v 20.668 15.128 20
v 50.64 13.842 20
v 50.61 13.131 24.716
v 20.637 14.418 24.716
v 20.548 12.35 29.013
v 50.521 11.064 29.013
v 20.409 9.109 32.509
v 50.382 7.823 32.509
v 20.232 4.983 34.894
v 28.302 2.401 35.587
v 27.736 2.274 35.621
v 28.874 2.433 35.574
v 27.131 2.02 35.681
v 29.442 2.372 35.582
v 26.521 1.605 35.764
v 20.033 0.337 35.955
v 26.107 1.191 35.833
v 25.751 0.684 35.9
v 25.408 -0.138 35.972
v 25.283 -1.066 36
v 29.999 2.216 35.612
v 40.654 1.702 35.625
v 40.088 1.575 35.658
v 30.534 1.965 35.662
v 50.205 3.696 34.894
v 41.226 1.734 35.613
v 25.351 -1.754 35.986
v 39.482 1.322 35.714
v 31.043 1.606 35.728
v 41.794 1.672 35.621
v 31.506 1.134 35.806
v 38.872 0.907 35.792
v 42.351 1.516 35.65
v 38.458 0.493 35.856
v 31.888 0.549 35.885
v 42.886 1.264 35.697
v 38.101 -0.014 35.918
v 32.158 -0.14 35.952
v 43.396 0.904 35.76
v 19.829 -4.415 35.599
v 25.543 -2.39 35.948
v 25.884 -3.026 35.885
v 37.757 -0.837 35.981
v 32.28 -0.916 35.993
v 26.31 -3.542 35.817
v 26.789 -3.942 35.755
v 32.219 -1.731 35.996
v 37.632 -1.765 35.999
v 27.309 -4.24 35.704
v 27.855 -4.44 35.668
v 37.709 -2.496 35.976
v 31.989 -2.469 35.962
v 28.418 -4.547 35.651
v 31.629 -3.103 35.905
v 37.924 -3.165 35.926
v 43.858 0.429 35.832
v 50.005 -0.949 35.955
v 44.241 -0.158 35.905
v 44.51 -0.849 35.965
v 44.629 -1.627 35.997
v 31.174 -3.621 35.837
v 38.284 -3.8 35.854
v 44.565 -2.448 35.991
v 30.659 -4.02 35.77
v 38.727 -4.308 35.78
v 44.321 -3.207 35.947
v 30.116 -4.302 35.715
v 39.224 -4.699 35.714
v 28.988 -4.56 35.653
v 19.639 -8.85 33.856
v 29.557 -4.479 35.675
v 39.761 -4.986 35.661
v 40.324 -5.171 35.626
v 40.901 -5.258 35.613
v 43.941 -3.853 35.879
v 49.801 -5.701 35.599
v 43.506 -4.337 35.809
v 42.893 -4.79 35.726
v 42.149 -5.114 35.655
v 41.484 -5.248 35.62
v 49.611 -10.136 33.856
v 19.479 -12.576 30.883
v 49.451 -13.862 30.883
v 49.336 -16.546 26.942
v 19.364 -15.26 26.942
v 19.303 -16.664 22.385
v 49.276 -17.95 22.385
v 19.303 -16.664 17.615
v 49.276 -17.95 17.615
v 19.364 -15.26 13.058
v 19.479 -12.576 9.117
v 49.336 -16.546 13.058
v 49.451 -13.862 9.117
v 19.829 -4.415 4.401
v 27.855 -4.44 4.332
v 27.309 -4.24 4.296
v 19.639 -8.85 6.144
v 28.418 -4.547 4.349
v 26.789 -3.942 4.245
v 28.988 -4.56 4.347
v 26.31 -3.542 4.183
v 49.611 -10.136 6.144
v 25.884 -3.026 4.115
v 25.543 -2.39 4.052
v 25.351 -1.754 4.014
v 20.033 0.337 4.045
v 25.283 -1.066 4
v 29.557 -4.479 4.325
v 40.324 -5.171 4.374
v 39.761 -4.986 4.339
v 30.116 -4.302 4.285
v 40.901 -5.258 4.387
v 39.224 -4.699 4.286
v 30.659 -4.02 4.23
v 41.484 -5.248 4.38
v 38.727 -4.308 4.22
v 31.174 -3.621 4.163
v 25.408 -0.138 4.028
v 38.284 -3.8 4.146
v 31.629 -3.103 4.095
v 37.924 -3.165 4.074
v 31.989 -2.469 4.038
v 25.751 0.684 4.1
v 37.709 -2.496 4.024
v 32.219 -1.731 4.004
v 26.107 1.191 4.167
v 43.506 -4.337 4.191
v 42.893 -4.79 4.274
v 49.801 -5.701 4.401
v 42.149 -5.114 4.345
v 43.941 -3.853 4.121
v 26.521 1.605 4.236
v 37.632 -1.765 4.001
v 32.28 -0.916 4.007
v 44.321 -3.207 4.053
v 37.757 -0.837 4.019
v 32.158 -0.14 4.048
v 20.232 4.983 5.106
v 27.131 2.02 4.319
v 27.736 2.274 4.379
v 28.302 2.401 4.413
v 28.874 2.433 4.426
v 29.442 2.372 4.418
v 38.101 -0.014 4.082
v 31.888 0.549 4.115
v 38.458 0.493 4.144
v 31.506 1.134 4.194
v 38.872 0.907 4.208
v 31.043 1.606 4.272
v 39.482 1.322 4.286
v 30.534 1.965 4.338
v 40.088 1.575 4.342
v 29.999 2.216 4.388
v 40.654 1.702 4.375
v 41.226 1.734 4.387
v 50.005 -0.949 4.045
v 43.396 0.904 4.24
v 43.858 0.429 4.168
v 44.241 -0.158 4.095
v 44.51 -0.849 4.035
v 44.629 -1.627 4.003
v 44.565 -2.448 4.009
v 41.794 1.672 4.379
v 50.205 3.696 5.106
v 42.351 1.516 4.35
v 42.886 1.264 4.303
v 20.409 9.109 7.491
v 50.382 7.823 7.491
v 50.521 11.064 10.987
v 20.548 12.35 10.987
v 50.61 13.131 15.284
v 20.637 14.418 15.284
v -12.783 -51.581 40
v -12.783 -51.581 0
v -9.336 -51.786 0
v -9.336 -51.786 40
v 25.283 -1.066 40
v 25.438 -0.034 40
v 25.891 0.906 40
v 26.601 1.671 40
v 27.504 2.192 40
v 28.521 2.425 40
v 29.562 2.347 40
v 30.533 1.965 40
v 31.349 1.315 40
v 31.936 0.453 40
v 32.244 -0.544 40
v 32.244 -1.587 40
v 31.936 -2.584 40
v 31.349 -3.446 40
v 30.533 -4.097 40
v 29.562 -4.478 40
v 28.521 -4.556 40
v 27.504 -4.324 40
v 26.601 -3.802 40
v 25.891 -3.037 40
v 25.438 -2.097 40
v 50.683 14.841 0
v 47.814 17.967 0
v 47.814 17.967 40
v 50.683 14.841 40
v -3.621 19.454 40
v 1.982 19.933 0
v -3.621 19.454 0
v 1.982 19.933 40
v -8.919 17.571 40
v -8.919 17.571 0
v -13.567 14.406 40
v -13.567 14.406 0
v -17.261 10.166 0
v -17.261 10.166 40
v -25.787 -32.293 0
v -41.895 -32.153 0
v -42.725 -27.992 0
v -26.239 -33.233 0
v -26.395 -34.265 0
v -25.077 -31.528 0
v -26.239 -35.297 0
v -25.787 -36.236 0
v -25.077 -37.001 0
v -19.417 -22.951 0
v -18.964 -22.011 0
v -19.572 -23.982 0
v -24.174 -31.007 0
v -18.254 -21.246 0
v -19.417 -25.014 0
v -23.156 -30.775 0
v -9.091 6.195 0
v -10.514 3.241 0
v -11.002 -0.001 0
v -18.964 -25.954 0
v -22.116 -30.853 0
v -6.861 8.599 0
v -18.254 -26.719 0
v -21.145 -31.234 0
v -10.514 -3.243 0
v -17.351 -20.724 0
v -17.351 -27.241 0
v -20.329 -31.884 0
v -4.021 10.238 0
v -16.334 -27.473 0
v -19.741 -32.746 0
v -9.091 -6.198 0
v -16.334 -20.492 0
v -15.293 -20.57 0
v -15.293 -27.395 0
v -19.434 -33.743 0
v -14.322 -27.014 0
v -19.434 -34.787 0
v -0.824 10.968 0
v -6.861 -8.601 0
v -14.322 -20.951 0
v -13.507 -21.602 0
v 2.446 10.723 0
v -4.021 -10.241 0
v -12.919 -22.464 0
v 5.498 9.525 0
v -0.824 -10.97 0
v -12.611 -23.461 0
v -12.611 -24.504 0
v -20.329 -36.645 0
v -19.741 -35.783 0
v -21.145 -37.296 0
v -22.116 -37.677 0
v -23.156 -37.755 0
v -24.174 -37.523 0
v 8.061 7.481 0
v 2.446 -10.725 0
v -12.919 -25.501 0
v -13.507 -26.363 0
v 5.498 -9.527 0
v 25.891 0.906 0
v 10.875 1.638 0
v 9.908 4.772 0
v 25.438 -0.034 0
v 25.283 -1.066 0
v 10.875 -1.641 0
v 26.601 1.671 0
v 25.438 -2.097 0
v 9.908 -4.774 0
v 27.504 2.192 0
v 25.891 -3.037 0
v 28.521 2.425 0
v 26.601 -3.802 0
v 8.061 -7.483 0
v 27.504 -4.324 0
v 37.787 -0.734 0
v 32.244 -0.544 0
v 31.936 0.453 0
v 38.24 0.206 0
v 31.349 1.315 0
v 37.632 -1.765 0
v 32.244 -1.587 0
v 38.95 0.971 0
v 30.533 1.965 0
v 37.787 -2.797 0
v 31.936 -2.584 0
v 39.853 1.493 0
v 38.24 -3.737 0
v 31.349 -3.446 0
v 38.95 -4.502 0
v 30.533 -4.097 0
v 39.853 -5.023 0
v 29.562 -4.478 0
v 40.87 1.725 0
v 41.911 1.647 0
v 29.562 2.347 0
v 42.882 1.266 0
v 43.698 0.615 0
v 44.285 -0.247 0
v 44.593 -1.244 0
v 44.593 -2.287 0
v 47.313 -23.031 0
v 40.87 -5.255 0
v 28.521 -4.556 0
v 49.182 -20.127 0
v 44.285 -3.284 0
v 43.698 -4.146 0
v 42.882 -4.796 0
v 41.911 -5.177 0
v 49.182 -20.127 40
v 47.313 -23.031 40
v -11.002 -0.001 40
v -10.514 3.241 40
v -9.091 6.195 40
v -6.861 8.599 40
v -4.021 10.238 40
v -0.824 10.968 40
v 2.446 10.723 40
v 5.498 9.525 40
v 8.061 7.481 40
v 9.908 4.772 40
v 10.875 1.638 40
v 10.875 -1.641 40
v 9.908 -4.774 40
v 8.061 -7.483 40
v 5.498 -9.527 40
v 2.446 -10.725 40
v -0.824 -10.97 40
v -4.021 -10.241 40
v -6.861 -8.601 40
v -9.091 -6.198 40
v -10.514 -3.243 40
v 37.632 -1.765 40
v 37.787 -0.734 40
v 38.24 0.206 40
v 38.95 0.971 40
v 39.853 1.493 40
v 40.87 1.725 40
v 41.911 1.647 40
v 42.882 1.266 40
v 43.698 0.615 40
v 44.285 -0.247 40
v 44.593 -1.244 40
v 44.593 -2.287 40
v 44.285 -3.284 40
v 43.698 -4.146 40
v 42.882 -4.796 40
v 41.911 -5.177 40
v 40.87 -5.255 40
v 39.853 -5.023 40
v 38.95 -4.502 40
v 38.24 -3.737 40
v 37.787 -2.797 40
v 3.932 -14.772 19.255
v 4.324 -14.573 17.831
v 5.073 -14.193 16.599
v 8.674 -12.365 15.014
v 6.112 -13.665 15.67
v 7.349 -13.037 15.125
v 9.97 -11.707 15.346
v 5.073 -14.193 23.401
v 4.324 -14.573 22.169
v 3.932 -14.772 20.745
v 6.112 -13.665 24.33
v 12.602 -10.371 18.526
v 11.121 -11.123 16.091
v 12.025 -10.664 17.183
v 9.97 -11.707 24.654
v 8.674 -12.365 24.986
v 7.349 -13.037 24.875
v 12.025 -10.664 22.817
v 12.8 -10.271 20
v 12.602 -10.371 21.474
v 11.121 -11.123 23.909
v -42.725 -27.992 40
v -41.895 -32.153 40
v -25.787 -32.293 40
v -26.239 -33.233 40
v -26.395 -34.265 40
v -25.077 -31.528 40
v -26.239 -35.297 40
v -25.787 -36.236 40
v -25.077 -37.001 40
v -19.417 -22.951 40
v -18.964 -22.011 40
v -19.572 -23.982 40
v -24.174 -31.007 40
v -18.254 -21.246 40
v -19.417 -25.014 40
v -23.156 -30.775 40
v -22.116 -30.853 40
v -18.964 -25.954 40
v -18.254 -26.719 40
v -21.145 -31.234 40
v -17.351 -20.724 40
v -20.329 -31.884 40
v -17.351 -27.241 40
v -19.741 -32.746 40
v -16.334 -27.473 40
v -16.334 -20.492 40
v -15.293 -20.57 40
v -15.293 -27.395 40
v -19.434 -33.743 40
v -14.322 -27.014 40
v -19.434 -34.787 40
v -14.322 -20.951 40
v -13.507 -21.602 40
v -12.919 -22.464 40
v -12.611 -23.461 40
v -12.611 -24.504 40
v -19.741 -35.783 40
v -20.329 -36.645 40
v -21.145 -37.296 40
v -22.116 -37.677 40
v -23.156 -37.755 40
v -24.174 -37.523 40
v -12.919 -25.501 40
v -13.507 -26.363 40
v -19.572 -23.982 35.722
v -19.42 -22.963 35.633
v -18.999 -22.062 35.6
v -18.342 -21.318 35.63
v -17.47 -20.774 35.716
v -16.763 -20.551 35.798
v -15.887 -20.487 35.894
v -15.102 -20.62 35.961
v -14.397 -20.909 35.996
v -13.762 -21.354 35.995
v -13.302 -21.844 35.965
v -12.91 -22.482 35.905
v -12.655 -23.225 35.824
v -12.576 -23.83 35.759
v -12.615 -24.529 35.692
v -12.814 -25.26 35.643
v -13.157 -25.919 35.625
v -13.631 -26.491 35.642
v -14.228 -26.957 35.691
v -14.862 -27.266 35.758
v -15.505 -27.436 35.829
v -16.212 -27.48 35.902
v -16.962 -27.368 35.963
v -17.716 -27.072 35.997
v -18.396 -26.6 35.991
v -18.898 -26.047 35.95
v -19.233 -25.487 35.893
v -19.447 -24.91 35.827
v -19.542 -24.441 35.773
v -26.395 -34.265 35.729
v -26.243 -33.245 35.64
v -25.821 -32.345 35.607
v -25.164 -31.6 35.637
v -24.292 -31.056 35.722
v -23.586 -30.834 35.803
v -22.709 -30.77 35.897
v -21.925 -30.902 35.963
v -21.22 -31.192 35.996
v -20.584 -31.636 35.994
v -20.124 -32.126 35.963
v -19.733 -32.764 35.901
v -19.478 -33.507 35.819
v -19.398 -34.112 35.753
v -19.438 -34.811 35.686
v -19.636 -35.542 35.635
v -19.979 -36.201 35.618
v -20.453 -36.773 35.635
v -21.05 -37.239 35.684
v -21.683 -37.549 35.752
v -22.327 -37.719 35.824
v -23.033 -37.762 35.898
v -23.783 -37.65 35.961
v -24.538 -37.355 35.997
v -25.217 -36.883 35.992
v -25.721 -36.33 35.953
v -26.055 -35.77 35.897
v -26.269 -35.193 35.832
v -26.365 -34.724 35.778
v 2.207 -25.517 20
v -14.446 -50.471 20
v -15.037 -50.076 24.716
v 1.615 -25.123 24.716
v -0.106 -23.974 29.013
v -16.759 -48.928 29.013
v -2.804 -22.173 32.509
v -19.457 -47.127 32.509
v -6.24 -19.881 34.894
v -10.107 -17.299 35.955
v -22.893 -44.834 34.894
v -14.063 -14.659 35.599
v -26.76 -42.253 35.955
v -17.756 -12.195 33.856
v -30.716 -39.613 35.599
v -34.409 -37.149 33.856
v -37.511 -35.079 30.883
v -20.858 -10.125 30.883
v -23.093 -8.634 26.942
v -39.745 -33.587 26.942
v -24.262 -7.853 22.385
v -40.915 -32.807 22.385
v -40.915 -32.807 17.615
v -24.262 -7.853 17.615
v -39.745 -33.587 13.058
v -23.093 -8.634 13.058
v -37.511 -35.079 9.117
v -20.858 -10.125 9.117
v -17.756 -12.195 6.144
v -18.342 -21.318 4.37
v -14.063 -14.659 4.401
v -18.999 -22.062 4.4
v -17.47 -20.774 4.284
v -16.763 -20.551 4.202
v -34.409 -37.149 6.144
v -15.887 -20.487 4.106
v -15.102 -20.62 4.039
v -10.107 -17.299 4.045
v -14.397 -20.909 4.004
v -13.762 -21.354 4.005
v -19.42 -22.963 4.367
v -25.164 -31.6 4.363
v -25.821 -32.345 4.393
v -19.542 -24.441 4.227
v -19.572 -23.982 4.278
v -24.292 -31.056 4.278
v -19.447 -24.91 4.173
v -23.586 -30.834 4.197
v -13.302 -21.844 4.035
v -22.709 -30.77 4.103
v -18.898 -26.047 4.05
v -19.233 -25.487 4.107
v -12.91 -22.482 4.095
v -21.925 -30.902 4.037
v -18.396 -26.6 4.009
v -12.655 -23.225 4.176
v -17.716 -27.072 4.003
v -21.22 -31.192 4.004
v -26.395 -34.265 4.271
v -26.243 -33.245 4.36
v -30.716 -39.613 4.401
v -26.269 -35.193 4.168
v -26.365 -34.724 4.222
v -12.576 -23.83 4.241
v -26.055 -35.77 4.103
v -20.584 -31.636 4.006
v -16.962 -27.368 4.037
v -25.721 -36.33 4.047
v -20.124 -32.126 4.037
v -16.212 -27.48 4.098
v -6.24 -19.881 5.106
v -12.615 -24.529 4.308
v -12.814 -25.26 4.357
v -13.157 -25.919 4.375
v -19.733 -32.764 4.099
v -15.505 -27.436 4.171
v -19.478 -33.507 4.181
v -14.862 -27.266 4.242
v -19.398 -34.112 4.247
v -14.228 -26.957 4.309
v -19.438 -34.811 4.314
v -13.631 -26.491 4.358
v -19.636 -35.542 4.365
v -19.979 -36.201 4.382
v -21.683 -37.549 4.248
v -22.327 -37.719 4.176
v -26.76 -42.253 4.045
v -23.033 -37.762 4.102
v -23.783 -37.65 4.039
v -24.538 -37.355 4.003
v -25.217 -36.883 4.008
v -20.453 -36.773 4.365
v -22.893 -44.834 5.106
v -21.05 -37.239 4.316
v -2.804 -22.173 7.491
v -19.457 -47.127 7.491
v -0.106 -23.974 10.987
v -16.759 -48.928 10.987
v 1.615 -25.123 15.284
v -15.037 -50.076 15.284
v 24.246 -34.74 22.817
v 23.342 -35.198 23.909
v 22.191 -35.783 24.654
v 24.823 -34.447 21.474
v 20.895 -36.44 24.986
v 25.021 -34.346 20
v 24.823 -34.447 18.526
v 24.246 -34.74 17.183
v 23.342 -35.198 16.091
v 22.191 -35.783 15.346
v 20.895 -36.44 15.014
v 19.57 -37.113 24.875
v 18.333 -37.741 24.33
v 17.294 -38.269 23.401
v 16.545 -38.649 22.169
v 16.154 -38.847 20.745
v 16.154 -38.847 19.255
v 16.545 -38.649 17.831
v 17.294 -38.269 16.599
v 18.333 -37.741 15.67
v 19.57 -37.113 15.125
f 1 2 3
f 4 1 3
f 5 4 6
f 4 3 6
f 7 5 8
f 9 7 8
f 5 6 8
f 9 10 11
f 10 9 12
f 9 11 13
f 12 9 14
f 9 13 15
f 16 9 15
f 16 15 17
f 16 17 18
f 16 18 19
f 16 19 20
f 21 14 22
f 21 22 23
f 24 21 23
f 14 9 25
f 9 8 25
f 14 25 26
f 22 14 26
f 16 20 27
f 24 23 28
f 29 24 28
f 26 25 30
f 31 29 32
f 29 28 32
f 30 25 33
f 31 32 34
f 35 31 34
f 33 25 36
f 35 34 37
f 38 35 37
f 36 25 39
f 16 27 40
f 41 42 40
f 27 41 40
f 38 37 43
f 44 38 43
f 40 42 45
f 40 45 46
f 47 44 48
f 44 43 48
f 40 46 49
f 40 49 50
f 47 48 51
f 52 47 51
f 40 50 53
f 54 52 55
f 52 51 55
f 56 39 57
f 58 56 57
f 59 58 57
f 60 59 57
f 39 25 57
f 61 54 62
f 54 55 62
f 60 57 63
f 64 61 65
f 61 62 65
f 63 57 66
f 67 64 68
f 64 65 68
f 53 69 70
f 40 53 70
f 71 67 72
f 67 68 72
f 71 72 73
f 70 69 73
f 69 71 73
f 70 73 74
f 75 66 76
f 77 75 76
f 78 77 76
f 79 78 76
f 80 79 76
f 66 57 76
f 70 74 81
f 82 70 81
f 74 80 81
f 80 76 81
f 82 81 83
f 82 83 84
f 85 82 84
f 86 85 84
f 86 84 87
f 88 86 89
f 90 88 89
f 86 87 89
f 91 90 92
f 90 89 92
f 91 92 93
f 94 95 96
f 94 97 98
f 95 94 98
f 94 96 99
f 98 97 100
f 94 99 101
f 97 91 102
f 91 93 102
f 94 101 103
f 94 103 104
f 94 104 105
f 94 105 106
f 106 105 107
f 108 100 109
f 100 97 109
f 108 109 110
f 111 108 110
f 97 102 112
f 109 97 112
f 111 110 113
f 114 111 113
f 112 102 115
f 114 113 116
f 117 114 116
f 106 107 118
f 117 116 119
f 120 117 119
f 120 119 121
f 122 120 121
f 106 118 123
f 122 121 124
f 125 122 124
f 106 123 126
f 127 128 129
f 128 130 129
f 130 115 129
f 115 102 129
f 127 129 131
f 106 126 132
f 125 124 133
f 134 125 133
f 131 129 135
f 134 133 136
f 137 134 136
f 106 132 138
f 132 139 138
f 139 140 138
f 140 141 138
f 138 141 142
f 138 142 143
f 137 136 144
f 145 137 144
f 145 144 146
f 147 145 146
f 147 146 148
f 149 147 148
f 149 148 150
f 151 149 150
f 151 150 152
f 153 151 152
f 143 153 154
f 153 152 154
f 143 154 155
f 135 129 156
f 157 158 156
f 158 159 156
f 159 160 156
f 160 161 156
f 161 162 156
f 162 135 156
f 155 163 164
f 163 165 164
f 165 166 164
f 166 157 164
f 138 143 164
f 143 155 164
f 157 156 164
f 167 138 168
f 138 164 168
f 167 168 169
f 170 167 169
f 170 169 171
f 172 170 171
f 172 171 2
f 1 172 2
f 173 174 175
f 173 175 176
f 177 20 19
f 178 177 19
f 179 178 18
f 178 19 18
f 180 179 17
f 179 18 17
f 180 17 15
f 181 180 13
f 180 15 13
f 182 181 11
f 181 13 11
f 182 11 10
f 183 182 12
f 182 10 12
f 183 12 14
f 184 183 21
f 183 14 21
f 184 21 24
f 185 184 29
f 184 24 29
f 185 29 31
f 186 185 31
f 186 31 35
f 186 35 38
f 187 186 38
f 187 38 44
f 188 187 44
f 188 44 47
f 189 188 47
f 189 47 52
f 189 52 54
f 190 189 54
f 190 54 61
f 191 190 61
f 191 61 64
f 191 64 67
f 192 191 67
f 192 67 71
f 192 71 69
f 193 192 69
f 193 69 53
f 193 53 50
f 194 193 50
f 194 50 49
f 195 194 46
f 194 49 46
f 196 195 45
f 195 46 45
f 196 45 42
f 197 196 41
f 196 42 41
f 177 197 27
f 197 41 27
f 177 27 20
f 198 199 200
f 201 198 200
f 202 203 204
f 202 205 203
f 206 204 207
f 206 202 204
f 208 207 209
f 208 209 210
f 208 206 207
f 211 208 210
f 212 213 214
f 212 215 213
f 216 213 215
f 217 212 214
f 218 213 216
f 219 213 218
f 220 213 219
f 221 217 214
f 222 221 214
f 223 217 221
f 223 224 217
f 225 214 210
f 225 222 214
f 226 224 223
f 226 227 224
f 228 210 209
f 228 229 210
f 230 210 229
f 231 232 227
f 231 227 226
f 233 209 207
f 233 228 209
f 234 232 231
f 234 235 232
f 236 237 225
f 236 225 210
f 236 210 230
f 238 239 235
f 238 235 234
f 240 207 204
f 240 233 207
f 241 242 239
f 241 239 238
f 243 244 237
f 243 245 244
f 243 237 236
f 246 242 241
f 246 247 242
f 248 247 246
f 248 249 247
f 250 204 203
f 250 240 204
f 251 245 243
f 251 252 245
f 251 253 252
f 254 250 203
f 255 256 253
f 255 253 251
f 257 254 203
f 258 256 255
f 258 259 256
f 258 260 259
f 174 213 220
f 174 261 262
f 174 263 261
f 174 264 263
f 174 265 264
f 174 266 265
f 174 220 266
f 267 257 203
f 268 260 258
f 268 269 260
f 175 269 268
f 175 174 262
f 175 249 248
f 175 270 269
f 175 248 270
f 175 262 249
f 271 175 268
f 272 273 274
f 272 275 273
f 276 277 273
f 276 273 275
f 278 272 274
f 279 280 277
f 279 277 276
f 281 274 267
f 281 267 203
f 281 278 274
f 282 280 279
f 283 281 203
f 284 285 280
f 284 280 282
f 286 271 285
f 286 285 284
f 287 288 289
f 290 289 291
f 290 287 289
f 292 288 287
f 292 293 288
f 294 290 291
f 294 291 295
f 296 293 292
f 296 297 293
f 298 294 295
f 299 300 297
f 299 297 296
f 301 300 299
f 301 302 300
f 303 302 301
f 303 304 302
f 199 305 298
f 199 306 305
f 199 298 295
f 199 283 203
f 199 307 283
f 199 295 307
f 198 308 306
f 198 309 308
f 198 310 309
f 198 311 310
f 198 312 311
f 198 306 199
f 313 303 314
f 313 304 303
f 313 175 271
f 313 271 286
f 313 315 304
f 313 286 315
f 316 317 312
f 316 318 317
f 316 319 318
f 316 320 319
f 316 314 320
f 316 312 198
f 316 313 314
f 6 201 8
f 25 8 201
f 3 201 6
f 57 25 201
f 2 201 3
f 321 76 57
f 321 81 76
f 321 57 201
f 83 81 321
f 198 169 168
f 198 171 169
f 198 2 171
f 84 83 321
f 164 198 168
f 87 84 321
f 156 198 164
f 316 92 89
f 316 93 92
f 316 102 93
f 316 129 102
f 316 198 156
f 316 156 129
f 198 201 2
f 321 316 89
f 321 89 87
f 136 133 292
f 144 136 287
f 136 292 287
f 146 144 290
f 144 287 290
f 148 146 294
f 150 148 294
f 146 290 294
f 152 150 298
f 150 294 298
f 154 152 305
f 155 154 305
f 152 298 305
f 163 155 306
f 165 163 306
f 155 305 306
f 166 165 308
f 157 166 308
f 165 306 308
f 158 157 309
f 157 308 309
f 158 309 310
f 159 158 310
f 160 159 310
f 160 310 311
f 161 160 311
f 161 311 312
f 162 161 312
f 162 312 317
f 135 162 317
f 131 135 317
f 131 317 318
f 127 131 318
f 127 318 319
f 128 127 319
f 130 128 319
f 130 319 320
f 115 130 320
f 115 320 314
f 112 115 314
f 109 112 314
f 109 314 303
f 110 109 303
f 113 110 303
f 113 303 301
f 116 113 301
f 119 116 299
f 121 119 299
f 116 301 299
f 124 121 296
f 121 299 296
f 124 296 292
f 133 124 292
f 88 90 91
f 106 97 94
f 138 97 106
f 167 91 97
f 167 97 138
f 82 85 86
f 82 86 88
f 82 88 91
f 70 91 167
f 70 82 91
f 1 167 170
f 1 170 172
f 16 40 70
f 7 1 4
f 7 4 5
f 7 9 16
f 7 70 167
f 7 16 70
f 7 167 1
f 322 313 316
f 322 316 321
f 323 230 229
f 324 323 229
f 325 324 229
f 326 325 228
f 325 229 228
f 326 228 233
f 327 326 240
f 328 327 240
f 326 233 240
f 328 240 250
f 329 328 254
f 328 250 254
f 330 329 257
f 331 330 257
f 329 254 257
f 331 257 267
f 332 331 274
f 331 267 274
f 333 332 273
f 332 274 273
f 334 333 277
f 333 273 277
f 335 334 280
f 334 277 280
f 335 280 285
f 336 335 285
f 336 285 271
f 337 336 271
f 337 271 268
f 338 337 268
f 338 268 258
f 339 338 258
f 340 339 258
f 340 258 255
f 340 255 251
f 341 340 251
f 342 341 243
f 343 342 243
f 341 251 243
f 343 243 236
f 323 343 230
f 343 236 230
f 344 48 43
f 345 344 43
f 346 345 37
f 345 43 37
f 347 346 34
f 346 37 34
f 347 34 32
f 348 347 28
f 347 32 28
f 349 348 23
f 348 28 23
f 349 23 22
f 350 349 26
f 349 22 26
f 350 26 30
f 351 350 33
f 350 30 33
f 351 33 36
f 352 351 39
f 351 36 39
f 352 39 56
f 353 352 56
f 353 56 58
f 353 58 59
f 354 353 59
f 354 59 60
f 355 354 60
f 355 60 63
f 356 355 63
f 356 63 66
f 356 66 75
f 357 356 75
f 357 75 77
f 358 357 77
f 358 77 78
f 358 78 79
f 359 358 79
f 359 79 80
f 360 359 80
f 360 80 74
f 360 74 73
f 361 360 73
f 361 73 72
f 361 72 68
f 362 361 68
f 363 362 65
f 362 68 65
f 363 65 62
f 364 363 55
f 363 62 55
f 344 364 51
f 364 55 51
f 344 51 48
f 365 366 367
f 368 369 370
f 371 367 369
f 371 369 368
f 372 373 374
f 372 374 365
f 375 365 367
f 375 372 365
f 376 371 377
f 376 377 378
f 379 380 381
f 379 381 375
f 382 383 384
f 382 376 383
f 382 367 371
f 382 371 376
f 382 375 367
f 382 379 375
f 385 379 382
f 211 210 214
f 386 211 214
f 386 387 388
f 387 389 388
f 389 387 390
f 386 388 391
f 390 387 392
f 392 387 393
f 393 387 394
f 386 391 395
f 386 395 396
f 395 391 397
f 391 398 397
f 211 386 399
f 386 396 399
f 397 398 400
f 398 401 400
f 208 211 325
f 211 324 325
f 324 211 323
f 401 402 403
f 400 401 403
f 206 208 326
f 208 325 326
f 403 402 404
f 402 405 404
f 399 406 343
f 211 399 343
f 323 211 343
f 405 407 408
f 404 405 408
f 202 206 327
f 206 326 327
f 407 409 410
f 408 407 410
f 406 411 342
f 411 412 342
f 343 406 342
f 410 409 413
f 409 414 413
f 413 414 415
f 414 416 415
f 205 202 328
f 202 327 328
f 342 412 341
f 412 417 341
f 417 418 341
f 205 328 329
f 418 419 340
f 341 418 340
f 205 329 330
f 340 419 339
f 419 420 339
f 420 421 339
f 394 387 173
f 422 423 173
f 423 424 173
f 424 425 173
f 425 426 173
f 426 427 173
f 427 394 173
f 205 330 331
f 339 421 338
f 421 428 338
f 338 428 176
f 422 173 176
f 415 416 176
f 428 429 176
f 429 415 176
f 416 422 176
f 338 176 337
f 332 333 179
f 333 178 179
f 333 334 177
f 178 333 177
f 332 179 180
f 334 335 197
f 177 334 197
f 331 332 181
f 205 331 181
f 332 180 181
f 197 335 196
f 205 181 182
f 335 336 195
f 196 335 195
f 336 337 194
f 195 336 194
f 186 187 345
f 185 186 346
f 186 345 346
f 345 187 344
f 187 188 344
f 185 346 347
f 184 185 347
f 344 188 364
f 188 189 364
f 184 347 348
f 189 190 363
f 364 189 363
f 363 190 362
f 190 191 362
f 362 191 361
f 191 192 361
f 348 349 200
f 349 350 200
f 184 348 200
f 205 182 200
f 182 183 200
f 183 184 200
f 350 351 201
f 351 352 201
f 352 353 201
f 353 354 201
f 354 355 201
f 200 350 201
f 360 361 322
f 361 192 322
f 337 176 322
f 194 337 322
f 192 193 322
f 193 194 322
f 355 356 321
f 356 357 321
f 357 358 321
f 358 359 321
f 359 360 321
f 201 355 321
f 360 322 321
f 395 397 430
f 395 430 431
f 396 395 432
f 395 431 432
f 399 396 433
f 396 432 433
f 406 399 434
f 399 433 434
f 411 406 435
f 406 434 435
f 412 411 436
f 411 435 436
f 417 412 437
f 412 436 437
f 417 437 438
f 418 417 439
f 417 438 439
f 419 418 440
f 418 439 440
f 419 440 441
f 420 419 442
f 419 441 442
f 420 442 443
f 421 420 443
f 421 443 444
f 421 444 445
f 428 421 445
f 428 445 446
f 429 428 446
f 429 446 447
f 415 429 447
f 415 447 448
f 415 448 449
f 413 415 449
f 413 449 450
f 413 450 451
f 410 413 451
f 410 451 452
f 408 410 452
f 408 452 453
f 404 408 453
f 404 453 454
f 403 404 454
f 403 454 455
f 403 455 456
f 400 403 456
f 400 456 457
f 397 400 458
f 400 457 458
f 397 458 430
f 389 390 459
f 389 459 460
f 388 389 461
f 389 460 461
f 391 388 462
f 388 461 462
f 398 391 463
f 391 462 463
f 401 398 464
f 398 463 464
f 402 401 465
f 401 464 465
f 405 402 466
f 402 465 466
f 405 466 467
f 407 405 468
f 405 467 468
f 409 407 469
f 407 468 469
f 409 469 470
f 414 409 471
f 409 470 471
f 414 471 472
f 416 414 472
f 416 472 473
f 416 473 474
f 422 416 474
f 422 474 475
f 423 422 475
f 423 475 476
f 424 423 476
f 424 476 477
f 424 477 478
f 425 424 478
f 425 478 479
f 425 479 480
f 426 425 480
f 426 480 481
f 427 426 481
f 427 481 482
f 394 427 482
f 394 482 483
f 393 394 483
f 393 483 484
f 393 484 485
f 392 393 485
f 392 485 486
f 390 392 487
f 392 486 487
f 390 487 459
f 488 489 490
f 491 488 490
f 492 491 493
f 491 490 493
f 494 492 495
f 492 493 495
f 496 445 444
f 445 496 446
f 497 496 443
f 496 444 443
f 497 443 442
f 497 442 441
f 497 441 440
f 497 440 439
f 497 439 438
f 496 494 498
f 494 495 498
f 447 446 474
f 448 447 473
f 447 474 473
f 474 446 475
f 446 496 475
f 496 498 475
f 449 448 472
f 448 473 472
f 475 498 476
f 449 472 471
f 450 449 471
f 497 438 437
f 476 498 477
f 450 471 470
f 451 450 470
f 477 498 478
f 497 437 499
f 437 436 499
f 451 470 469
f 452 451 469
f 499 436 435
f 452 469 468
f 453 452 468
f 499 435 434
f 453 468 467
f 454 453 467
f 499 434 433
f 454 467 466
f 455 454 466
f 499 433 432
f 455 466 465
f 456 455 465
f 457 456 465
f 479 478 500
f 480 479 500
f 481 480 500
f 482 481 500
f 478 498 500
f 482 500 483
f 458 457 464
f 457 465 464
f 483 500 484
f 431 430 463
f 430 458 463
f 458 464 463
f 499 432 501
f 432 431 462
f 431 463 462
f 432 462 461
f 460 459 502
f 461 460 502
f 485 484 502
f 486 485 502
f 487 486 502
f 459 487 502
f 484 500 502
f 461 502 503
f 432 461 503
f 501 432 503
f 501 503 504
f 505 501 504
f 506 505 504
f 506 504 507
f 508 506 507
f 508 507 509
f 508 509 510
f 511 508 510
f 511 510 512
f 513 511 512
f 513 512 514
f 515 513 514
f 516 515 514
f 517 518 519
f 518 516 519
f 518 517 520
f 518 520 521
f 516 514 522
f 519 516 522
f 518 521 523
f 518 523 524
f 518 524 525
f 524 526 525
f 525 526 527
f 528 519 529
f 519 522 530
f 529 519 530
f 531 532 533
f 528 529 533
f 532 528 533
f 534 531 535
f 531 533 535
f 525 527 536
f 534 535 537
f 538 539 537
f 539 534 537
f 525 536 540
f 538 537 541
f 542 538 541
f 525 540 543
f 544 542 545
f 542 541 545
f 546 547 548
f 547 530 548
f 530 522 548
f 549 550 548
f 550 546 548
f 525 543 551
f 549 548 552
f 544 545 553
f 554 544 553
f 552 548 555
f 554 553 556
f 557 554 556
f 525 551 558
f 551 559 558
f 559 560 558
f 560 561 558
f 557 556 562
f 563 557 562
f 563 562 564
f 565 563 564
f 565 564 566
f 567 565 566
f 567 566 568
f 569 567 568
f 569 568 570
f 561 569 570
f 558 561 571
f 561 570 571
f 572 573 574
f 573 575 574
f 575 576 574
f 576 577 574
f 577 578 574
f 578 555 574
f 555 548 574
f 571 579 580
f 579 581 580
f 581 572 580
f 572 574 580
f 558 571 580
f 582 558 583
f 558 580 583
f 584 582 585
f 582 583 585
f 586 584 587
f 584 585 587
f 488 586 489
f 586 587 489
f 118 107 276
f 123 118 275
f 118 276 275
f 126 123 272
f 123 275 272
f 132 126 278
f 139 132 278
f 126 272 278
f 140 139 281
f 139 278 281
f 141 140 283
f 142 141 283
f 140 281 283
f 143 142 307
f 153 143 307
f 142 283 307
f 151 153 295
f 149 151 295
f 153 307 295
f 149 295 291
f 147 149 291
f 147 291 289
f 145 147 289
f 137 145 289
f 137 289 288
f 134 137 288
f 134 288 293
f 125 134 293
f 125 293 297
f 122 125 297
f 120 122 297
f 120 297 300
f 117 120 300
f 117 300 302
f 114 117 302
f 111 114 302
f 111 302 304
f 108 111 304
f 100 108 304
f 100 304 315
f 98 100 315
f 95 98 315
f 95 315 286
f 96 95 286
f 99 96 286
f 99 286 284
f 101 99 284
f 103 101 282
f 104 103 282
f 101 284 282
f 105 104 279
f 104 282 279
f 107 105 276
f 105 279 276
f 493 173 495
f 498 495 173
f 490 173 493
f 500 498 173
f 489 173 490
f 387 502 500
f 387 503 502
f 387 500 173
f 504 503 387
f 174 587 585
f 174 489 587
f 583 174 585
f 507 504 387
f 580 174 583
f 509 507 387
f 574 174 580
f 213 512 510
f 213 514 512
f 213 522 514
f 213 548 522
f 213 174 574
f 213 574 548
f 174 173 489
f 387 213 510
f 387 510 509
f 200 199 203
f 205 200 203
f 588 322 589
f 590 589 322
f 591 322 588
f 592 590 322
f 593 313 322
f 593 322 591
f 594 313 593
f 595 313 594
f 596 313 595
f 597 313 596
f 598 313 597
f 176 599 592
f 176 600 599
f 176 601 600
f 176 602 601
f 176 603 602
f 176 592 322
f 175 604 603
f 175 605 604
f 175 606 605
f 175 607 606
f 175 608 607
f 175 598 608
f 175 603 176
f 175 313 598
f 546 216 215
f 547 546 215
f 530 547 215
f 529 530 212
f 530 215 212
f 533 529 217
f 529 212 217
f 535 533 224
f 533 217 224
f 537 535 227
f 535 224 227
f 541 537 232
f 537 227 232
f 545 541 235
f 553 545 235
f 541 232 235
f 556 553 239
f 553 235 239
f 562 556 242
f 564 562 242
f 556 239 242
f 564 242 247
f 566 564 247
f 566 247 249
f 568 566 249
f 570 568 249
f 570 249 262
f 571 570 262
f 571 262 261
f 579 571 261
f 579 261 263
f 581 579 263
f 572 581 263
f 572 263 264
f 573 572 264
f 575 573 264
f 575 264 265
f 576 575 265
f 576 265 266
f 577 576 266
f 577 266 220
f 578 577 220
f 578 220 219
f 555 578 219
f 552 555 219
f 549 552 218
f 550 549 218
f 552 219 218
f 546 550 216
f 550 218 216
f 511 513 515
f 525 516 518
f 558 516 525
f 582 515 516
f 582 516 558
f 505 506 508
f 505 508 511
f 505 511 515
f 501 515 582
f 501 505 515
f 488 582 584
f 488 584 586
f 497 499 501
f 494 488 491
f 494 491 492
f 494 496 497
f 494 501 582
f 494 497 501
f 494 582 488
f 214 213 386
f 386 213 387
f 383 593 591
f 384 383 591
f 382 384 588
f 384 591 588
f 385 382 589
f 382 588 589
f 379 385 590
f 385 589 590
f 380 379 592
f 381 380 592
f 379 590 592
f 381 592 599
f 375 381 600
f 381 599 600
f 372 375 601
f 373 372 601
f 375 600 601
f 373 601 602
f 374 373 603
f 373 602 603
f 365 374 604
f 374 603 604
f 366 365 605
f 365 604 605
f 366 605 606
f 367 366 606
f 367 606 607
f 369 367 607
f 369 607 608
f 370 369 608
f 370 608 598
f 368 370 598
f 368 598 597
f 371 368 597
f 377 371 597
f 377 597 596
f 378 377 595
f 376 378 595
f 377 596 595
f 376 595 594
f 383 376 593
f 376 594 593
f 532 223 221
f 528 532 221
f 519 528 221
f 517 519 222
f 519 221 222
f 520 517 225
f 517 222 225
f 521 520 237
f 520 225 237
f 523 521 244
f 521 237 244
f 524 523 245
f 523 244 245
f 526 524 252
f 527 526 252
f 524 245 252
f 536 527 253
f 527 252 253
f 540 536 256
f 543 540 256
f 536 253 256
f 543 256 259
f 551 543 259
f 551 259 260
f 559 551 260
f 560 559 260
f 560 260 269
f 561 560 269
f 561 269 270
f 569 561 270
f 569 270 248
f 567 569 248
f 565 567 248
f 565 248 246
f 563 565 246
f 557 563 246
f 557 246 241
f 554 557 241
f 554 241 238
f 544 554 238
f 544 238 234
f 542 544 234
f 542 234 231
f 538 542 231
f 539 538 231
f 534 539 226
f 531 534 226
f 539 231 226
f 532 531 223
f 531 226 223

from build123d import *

# Parameters (mm, degrees)
BOSS_EXTRUDE6_DEPTH = 40
SKETCH9_R           = 16
CUT_EXTRUDE3_DEPTH  = 30
SKETCH10_R          = 16
CUT_EXTRUDE4_DEPTH  = 30
CUT_EXTRUDE5_REACH  = 89.959
SKETCH11_R          = 3.5
SKETCH12_R          = 11
CUT_EXTRUDE6_DEPTH  = 40
SKETCH14_W          = 106.764973624
SKETCH14_H          = 40
BOSS_EXTRUDE7_DEPTH = 5
CUT_EXTRUDE8_DEPTH  = 40
FILLET1_R           = 22
CHAMFER5_SIZE       = 2
CHAMFER6_SIZE       = 3
SKETCH16_R          = 5
CUT_EXTRUDE9_DEPTH  = 27


with BuildPart() as part:
    # Sketch8 → Boss-Extrude6 (new body)
    with BuildSketch(Plane.XY):
        Polygon((-57.969476198, -3.736595203), (37.23247397, 44.588846099), (50.811489539, 17.83795198), (-44.390460629, -30.487489322), align=None)
        Polygon((50.811489539, 17.83795198), (49.096562756, -22.125268937), (-11.118961612, -52.691258219), (-44.390460629, -30.487489322), align=None)
    extrude(amount=BOSS_EXTRUDE6_DEPTH)

    # Sketch9 → Cut-Extrude3 (cut)
    with BuildSketch(Plane(origin=(-27.75471112, -41.58937377, 0), x_dir=(-0.8317874754097543, 0.5550942224086534, 0), z_dir=(-0.5550942224086534, -0.8317874754097543, 0))):
        with Locations(Location((0, -20, 0), (0, 0, 180))):
            Circle(SKETCH9_R)
    extrude(amount=-CUT_EXTRUDE3_DEPTH, mode=Mode.SUBTRACT)

    # Sketch10 → Cut-Extrude4 (cut)
    with BuildSketch(Plane(origin=(49.954026147, -2.143658479, 0), x_dir=(0, 0, -1), z_dir=(0.9990805229464255, -0.04287316957138965, 0))):
        with Locations(Location((-20, 0, 0), (0, 0, 90))):
            Circle(SKETCH10_R)
    extrude(amount=-CUT_EXTRUDE4_DEPTH, mode=Mode.SUBTRACT)

    # Cut-Extrude5: up to this face of the body (flat: up to its plane)
    cut_extrude5_end = Plane(part.part.faces().sort_by_distance((3.278005206, -6.45772661, 40))[0])
    # Sketch11 → Cut-Extrude5 (cut, up to the picked face)
    with BuildSketch(Plane(origin=(0, 0, 0), x_dir=(-1, 0, 0), z_dir=(0, 0, -1)), mode=Mode.PRIVATE) as cut_extrude5_sk1:
        with Locations((16.072269088, -23.982451877)):
            Circle(SKETCH11_R)
    cut_extrude5_tool1 = split(extrude(cut_extrude5_sk1.sketch, amount=-CUT_EXTRUDE5_REACH, mode=Mode.PRIVATE), bisect_by=cut_extrude5_end, keep=Keep.BOTH, mode=Mode.PRIVATE)
    # Sketch11 → Cut-Extrude5 (cut, up to the picked face)
    with BuildSketch(Plane(origin=(0, 0, 0), x_dir=(-1, 0, 0), z_dir=(0, 0, -1)), mode=Mode.PRIVATE) as cut_extrude5_sk2:
        with Locations((22.894837472, -34.264871857)):
            Circle(SKETCH11_R)
    cut_extrude5_tool2 = split(extrude(cut_extrude5_sk2.sketch, amount=-CUT_EXTRUDE5_REACH, mode=Mode.PRIVATE), bisect_by=cut_extrude5_end, keep=Keep.BOTH, mode=Mode.PRIVATE)
    # Sketch11 → Cut-Extrude5 (cut, up to the picked face)
    with BuildSketch(Plane(origin=(0, 0, 0), x_dir=(-1, 0, 0), z_dir=(0, 0, -1)), mode=Mode.PRIVATE) as cut_extrude5_sk3:
        with Locations((-28.78289974, -1.065658383)):
            Circle(SKETCH11_R)
    cut_extrude5_tool3 = split(extrude(cut_extrude5_sk3.sketch, amount=-CUT_EXTRUDE5_REACH, mode=Mode.PRIVATE), bisect_by=cut_extrude5_end, keep=Keep.BOTH, mode=Mode.PRIVATE)
    # Sketch11 → Cut-Extrude5 (cut, up to the picked face)
    with BuildSketch(Plane(origin=(0, 0, 0), x_dir=(-1, 0, 0), z_dir=(0, 0, -1)), mode=Mode.PRIVATE) as cut_extrude5_sk4:
        with Locations((-41.131848905, -1.765246078)):
            Circle(SKETCH11_R)
    cut_extrude5_tool4 = split(extrude(cut_extrude5_sk4.sketch, amount=-CUT_EXTRUDE5_REACH, mode=Mode.PRIVATE), bisect_by=cut_extrude5_end, keep=Keep.BOTH, mode=Mode.PRIVATE)
    add(cut_extrude5_tool1.solids().sort_by(Axis((-16.072269, -23.982452, 0), (0, 0, 1)))[0], mode=Mode.SUBTRACT)
    add(cut_extrude5_tool2.solids().sort_by(Axis((-22.894837, -34.264872, 0), (0, 0, 1)))[0], mode=Mode.SUBTRACT)
    add(cut_extrude5_tool3.solids().sort_by(Axis((28.7829, -1.065658, 0), (0, 0, 1)))[0], mode=Mode.SUBTRACT)
    add(cut_extrude5_tool4.solids().sort_by(Axis((41.131849, -1.765246, 0), (0, 0, 1)))[0], mode=Mode.SUBTRACT)

    # Sketch12 → Cut-Extrude6 (cut)
    with BuildSketch(Plane(origin=(0, 0, 0), x_dir=(-1, 0, 0), z_dir=(0, 0, -1))):
        with Locations((0.002217481, -0.001125615)):
            Circle(SKETCH12_R)
    extrude(amount=-CUT_EXTRUDE6_DEPTH, mode=Mode.SUBTRACT)

    # Sketch14 → Boss-Extrude7 (add)
    with BuildSketch(Plane(origin=(-10.368501114, 20.426125448, 0), x_dir=(0.8916964706359383, 0.45263385230825515, 0), z_dir=(-0.45263385230825526, 0.8916964706359384, 0))):
        with Locations((0, -20)):
            Rectangle(SKETCH14_W, SKETCH14_H)
    extrude(amount=BOSS_EXTRUDE7_DEPTH)

    # Sketch15 → Cut-Extrude8 (cut)
    with BuildSketch(Plane(origin=(0, 0, 0), x_dir=(-1, 0, 0), z_dir=(0, 0, -1))):
        Polygon((20.486288281, 20.897526908), (10.387815393, 20.46417491), (44.390460629, -30.487489322), (60.232645459, 0.72188715), align=None)
        Polygon((-34.969304708, 49.047328453), (-50.811489539, 17.83795198), (10.387815393, 20.46417491), (4.777052471, 28.871688695), align=None)
        Polygon((4.777052471, 28.871688695), (10.387815393, 20.46417491), (20.486288281, 20.897526908), align=None)
    extrude(amount=-CUT_EXTRUDE8_DEPTH, mode=Mode.SUBTRACT)

    # Fillet1
    fillet1_edges = [part.edges().sort_by_distance(p)[0] for p in [
        (-10.387815393, 20.46417491, 20),
    ]]
    fillet(fillet1_edges, radius=FILLET1_R)

    # Chamfer5
    chamfer5_edges = [part.edges().sort_by_distance(p)[0] for p in [
        (49.096562756, -22.125268937, 20),
        (-11.118961612, -52.691258219, 20),
    ]]
    chamfer(chamfer5_edges, length=CHAMFER5_SIZE)

    # Chamfer6
    chamfer6_edges = [part.edges().sort_by_distance(p)[0] for p in [
        (50.811489539, 17.83795198, 20),
        (-44.390460629, -30.487489322, 20),
    ]]
    chamfer(chamfer6_edges, length=CHAMFER6_SIZE)

    # Sketch16 → Cut-Extrude9 (cut)
    with BuildSketch(Plane(origin=(18.988800572, -37.408263578, 0), x_dir=(-0.8916964706359382, -0.4526338523082556, 0), z_dir=(0.4526338523082556, -0.8916964706359382, 0))):
        with Locations(Location((-1.764586017, -20, 0), (0, 0, 180))):
            Circle(SKETCH16_R)
    extrude(amount=-CUT_EXTRUDE9_DEPTH, mode=Mode.SUBTRACT)


solid = part.part
